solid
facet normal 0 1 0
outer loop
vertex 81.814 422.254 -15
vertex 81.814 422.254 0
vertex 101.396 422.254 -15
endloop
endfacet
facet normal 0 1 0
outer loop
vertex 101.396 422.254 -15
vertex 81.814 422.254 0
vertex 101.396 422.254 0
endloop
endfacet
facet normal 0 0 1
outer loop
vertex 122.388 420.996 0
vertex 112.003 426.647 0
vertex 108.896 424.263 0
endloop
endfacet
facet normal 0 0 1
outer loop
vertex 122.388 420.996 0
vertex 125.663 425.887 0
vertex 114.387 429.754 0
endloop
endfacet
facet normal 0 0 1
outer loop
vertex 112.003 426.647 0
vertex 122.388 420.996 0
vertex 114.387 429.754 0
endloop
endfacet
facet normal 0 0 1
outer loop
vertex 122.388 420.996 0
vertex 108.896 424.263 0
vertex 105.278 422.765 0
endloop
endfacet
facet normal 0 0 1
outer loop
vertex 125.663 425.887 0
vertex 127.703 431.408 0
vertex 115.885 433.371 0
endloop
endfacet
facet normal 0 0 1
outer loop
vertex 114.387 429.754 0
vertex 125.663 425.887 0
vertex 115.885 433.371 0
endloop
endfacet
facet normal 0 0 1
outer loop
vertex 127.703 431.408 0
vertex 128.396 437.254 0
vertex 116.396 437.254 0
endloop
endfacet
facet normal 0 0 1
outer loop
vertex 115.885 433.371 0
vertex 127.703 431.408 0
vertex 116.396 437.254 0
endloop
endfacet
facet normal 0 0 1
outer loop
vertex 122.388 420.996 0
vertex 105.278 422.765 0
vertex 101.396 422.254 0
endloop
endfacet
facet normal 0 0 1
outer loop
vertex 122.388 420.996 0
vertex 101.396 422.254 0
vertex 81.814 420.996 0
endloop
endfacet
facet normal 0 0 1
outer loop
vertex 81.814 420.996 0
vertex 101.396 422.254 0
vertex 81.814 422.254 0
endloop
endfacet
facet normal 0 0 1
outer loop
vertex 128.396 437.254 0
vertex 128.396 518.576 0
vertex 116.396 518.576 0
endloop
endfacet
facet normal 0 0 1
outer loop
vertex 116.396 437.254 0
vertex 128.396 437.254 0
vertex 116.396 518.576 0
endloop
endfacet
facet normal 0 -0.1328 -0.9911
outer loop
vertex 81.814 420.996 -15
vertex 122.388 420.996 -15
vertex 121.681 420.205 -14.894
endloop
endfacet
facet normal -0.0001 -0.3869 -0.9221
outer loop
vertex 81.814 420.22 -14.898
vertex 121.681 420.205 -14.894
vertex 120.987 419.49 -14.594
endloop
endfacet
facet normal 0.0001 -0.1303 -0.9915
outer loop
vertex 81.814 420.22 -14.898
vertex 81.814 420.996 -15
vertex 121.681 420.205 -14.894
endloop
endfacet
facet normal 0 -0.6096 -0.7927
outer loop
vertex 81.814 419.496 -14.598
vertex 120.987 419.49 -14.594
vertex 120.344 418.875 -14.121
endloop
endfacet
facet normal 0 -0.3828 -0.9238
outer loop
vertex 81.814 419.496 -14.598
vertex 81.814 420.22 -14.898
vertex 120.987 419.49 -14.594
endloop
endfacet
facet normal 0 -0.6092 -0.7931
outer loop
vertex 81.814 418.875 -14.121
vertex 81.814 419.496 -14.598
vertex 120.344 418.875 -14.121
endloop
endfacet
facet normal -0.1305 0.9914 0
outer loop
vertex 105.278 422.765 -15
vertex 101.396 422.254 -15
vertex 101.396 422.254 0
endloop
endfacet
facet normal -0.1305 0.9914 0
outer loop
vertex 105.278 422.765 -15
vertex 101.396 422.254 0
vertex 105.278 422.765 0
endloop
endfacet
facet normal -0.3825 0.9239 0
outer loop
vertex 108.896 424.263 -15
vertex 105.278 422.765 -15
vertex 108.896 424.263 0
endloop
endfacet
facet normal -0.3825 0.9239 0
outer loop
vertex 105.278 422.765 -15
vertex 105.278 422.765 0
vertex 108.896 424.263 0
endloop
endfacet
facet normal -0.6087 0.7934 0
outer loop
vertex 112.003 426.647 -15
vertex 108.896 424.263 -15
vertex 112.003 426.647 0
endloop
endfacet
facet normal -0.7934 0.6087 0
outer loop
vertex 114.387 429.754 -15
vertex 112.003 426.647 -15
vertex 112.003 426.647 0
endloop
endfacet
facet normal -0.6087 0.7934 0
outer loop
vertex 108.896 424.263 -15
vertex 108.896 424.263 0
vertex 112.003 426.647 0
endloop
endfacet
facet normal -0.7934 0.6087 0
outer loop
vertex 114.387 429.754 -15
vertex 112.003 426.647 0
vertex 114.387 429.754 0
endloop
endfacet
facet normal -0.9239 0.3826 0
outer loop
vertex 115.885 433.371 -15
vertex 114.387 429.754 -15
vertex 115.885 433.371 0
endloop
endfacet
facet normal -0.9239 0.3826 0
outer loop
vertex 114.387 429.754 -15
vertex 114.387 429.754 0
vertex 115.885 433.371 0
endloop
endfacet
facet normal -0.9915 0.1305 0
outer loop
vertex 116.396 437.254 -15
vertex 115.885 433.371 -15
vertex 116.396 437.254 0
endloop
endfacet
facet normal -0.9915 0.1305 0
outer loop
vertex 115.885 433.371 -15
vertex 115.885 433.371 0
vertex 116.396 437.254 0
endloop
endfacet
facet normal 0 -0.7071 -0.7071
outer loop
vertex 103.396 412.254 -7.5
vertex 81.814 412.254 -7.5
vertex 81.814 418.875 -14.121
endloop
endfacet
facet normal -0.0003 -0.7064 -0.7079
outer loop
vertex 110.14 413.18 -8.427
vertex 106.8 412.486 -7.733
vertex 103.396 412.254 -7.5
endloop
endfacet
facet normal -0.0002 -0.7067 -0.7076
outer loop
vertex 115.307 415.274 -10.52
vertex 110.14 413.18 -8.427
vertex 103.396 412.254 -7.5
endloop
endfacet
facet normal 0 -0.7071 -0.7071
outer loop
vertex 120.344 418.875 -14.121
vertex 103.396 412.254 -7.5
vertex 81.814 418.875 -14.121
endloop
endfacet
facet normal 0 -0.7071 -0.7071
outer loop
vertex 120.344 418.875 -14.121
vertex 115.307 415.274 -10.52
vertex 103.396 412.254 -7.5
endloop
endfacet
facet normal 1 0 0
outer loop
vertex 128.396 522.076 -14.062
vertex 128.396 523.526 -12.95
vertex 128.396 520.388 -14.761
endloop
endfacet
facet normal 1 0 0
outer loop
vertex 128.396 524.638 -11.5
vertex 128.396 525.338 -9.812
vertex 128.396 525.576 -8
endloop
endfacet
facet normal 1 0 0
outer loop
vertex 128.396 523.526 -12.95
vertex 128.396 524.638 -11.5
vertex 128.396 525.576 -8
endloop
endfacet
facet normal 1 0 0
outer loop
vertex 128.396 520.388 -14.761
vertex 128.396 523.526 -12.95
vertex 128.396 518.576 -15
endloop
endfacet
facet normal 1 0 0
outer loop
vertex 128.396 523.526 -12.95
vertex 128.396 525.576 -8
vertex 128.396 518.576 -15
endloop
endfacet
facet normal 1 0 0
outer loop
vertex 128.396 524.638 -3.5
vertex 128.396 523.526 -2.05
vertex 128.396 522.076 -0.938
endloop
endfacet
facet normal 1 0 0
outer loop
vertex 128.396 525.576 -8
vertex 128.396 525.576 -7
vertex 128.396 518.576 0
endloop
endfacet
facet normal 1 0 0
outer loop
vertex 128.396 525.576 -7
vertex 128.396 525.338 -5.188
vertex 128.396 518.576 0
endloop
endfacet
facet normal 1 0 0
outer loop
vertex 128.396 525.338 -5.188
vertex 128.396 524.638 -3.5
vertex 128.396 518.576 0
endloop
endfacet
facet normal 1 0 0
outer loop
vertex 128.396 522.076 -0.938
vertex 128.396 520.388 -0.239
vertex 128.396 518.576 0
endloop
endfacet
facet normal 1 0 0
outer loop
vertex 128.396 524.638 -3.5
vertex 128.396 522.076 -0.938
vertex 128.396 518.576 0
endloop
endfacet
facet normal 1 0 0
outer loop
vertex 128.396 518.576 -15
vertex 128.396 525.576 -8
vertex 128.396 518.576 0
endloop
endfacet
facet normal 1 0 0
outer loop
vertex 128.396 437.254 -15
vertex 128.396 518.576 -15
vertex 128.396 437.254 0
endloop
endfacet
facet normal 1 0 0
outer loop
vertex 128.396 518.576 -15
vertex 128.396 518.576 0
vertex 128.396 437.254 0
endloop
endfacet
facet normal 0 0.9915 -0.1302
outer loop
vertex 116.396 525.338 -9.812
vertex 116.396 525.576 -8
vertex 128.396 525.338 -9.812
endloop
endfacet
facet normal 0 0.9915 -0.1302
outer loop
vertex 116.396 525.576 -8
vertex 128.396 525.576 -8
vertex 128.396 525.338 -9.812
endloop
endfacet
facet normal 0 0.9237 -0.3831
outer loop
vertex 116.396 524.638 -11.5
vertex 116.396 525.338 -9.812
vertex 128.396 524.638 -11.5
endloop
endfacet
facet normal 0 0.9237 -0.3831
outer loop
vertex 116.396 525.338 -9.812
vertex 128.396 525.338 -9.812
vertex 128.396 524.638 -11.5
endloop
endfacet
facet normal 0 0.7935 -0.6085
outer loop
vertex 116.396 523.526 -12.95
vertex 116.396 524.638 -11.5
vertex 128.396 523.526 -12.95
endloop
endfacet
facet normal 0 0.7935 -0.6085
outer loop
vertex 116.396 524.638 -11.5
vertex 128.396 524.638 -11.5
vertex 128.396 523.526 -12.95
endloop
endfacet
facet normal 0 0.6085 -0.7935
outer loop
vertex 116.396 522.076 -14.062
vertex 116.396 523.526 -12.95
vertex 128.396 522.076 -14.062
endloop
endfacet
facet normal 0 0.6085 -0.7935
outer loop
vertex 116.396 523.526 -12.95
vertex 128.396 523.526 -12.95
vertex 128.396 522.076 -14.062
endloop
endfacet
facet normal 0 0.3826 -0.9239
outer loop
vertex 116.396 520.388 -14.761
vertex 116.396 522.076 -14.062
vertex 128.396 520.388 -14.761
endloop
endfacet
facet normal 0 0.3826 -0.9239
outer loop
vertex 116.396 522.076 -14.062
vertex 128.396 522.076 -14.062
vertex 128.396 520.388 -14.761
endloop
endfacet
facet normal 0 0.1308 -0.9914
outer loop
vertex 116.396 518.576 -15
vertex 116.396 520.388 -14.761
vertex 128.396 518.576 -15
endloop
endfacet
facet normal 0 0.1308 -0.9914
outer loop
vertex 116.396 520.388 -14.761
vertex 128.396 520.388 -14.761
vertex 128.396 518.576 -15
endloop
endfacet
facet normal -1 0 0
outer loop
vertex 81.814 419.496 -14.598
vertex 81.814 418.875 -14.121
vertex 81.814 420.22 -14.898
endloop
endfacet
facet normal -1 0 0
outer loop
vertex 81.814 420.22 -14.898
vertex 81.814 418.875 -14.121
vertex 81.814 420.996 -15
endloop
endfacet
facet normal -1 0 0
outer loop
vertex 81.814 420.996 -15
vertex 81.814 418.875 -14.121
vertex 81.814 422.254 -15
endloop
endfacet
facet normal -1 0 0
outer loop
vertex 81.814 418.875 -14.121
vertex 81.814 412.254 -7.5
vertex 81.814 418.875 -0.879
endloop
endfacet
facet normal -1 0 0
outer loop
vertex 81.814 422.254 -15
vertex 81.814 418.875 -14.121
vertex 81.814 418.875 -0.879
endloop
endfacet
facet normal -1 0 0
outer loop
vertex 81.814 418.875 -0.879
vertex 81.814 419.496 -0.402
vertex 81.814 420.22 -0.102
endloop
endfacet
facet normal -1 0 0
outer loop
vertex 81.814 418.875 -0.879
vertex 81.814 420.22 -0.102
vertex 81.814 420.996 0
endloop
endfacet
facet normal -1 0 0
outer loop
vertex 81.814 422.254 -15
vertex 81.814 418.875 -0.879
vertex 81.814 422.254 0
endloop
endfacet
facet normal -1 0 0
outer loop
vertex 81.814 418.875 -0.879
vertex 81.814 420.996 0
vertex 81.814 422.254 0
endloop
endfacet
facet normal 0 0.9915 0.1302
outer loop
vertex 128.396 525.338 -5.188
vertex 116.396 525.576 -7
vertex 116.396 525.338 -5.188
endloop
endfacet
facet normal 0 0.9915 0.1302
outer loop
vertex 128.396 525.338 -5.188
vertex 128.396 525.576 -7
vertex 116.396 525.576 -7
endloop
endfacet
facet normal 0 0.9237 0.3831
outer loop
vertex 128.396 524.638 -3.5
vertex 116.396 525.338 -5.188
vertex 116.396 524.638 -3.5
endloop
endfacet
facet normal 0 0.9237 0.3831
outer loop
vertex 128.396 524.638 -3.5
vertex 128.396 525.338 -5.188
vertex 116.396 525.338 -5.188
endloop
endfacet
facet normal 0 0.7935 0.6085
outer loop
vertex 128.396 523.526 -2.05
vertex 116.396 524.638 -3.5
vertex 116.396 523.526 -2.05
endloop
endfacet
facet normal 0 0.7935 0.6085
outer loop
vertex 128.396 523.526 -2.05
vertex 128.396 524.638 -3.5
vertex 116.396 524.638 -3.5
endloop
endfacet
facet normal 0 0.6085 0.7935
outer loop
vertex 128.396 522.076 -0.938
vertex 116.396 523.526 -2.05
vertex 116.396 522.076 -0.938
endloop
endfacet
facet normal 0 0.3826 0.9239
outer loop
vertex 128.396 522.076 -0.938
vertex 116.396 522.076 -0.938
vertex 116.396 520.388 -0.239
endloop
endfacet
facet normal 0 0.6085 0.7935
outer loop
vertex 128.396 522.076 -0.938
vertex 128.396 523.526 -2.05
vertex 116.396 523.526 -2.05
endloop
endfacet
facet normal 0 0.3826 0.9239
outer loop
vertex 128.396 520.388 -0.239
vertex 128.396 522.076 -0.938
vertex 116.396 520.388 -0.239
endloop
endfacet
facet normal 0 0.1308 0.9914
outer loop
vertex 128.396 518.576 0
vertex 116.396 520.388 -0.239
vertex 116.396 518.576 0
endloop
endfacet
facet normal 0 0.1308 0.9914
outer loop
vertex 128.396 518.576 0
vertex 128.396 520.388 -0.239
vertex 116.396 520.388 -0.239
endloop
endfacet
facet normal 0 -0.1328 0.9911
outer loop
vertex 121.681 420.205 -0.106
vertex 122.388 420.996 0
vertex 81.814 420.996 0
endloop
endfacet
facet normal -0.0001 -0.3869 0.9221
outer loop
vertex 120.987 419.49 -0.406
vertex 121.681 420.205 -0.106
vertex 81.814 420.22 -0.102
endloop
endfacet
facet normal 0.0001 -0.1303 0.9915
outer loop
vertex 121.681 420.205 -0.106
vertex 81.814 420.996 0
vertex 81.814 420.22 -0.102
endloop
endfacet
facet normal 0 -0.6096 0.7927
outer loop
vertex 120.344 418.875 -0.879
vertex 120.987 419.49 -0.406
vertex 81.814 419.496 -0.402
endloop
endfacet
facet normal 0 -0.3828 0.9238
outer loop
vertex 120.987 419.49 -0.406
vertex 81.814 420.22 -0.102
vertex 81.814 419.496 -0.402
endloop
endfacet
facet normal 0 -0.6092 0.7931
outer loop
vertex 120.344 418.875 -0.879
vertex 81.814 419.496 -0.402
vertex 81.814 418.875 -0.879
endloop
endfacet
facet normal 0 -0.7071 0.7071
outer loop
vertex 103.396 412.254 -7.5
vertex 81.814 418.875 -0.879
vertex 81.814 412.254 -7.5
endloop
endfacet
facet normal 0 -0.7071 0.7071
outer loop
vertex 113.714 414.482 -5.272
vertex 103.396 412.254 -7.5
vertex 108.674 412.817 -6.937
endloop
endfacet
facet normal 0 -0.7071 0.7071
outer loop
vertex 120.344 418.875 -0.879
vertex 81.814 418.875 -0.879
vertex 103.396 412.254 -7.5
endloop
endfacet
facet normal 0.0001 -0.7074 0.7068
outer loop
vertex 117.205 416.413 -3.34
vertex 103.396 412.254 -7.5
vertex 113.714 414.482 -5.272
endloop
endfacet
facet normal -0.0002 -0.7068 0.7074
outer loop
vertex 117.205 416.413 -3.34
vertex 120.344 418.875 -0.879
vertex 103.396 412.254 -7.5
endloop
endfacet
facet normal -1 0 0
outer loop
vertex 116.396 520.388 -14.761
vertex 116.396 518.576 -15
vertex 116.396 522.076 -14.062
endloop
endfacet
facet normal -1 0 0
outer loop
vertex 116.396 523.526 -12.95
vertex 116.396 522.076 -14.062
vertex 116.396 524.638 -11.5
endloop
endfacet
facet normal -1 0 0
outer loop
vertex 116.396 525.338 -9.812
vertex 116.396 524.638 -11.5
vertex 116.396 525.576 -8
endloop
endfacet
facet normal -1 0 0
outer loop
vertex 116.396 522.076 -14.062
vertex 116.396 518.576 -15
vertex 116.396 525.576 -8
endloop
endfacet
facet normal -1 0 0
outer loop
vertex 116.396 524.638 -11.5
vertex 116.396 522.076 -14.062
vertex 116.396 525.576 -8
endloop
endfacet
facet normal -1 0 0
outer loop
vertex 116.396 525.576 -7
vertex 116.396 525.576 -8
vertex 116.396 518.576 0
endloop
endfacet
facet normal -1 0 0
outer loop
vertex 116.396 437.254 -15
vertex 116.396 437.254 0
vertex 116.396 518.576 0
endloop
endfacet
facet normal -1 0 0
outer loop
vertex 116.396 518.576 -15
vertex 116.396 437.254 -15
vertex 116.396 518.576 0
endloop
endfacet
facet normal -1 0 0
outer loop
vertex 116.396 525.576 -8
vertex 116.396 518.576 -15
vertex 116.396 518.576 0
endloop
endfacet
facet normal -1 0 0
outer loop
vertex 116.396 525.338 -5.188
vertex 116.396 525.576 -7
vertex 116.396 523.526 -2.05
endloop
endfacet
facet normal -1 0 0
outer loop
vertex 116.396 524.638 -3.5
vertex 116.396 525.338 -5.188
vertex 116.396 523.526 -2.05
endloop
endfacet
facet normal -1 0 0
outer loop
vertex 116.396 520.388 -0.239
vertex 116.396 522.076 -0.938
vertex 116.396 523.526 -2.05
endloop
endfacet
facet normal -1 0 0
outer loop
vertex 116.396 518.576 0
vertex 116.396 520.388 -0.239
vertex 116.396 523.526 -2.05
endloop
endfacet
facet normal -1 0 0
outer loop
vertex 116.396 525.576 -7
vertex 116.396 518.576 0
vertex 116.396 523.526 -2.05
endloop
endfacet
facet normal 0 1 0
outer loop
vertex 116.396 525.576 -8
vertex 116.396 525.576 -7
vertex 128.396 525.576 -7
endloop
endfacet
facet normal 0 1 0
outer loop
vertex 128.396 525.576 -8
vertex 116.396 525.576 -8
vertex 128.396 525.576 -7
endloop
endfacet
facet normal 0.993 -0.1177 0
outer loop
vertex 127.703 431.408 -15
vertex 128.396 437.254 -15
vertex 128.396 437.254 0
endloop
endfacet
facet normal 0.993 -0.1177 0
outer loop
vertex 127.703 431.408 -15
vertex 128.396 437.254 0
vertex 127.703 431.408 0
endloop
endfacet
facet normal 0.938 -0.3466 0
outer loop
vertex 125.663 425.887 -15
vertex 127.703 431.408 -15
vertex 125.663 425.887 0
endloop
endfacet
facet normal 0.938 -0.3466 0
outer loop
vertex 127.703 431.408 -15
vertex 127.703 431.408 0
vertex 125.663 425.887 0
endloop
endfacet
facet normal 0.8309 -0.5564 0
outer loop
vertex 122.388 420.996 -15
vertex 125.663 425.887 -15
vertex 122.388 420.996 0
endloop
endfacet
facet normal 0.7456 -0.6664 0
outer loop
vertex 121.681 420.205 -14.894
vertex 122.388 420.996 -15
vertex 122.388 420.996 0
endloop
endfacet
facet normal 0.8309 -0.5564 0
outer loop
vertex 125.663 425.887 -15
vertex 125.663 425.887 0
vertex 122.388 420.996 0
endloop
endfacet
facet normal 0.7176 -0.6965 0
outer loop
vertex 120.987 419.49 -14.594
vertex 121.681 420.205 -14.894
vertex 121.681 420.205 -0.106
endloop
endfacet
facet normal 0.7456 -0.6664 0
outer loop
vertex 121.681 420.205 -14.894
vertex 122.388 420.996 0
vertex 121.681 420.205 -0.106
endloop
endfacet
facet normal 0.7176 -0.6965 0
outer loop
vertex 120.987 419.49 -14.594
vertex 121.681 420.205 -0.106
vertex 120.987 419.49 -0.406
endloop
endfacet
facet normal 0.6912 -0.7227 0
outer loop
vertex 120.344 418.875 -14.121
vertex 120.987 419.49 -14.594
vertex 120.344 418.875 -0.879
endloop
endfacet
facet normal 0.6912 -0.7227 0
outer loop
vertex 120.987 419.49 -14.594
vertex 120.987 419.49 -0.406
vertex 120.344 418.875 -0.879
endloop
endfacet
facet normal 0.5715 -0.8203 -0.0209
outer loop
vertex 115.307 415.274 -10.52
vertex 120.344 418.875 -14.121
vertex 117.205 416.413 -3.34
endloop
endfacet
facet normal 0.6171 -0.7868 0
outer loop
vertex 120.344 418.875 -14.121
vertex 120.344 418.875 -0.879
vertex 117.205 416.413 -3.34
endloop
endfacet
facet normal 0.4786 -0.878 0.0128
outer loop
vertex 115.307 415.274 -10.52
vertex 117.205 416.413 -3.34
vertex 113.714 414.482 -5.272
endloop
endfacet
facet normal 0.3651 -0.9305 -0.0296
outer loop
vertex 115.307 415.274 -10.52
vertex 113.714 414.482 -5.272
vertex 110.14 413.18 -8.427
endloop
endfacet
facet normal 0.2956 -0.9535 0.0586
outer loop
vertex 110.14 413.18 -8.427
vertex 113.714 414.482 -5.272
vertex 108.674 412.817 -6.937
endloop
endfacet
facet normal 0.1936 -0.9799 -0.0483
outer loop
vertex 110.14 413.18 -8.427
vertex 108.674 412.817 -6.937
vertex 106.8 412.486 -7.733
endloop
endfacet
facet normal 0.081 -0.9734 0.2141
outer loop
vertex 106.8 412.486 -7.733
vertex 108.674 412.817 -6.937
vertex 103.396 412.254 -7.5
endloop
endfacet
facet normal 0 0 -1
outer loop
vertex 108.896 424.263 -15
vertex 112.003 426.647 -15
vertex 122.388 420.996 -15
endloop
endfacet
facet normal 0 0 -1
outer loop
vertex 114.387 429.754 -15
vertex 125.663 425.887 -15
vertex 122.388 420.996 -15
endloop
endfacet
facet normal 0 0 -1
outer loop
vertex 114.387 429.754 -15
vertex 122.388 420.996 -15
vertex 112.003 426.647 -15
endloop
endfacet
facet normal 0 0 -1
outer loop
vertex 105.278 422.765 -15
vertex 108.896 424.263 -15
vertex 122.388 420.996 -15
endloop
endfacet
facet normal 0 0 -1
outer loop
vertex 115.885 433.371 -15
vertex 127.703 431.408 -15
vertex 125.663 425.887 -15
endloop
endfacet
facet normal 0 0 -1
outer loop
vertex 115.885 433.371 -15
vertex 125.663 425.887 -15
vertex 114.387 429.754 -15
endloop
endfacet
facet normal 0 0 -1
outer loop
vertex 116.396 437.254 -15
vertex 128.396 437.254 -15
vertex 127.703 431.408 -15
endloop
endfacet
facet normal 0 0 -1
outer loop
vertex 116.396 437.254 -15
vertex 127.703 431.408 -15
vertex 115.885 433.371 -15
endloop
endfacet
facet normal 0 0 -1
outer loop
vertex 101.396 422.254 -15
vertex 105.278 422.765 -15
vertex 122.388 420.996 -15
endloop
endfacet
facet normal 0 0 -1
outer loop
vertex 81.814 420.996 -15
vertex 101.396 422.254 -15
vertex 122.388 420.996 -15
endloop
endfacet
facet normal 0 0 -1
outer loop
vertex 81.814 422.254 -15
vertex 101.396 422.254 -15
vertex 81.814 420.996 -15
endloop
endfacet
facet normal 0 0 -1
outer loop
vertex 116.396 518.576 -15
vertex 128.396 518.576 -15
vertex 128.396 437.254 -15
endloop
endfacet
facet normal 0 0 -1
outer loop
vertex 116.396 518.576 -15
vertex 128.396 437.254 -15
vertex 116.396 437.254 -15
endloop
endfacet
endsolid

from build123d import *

# Parameters (mm, degrees)
BOSS_EXTRUDE1_DEPTH = 15
FILLET1_R           = 7
CUT_EXTRUDE1_DEPTH  = 46.581927456
FILLET2_R           = 3


with BuildPart() as part:
    # Sketch1 → Boss-Extrude1 (new body)
    with BuildSketch(Plane.XY):
        with BuildLine():
            Line((81.814228499, 422.253610621), (101.396155955, 422.253610621))
            ThreePointArc((101.396155955, 422.253610621), (112.002757673, 426.647008903), (116.396155955, 437.253610621))
            Line((116.396155955, 437.253610621), (116.396155955, 525.576232013))
            Line((116.396155955, 525.576232013), (128.396155955, 525.576232013))
            Line((128.396155955, 525.576232013), (128.396155955, 437.253610621))
            ThreePointArc((128.396155955, 437.253610621), (121.073825485, 419.575941091), (103.396155955, 412.253610621))
            Line((103.396155955, 412.253610621), (81.814228499, 412.253610621))
            Line((81.814228499, 412.253610621), (81.814228499, 422.253610621))
        make_face()
    extrude(amount=-BOSS_EXTRUDE1_DEPTH)

    # Fillet1
    fillet1_edges = [part.edges().sort_by_distance(p)[0] for p in [
        (122.396155955, 525.576232013, -15),
        (122.396155955, 525.576232013, 0),
    ]]
    fillet(fillet1_edges, radius=FILLET1_R)

    # Sketch2 → Cut-Extrude1 (cut)
    with BuildSketch(Plane(origin=(128.396155955, 0, 0), x_dir=(0, 0, -1), z_dir=(1, 0, 0))):
        Polygon((0, 419.753610621), (7.5, 412.253610621), (15, 419.753610621), (15, 408.691340296), (0, 408.691340296), align=None)
    extrude(amount=-CUT_EXTRUDE1_DEPTH, mode=Mode.SUBTRACT)

    # Fillet2
    fillet2_edges = [part.edges().sort_by_distance(p)[0] for p in [
        (101.531977763, 419.753610621, -15),
        (101.531977763, 419.753610621, 0),
    ]]
    fillet(fillet2_edges, radius=FILLET2_R)


solid = part.part
